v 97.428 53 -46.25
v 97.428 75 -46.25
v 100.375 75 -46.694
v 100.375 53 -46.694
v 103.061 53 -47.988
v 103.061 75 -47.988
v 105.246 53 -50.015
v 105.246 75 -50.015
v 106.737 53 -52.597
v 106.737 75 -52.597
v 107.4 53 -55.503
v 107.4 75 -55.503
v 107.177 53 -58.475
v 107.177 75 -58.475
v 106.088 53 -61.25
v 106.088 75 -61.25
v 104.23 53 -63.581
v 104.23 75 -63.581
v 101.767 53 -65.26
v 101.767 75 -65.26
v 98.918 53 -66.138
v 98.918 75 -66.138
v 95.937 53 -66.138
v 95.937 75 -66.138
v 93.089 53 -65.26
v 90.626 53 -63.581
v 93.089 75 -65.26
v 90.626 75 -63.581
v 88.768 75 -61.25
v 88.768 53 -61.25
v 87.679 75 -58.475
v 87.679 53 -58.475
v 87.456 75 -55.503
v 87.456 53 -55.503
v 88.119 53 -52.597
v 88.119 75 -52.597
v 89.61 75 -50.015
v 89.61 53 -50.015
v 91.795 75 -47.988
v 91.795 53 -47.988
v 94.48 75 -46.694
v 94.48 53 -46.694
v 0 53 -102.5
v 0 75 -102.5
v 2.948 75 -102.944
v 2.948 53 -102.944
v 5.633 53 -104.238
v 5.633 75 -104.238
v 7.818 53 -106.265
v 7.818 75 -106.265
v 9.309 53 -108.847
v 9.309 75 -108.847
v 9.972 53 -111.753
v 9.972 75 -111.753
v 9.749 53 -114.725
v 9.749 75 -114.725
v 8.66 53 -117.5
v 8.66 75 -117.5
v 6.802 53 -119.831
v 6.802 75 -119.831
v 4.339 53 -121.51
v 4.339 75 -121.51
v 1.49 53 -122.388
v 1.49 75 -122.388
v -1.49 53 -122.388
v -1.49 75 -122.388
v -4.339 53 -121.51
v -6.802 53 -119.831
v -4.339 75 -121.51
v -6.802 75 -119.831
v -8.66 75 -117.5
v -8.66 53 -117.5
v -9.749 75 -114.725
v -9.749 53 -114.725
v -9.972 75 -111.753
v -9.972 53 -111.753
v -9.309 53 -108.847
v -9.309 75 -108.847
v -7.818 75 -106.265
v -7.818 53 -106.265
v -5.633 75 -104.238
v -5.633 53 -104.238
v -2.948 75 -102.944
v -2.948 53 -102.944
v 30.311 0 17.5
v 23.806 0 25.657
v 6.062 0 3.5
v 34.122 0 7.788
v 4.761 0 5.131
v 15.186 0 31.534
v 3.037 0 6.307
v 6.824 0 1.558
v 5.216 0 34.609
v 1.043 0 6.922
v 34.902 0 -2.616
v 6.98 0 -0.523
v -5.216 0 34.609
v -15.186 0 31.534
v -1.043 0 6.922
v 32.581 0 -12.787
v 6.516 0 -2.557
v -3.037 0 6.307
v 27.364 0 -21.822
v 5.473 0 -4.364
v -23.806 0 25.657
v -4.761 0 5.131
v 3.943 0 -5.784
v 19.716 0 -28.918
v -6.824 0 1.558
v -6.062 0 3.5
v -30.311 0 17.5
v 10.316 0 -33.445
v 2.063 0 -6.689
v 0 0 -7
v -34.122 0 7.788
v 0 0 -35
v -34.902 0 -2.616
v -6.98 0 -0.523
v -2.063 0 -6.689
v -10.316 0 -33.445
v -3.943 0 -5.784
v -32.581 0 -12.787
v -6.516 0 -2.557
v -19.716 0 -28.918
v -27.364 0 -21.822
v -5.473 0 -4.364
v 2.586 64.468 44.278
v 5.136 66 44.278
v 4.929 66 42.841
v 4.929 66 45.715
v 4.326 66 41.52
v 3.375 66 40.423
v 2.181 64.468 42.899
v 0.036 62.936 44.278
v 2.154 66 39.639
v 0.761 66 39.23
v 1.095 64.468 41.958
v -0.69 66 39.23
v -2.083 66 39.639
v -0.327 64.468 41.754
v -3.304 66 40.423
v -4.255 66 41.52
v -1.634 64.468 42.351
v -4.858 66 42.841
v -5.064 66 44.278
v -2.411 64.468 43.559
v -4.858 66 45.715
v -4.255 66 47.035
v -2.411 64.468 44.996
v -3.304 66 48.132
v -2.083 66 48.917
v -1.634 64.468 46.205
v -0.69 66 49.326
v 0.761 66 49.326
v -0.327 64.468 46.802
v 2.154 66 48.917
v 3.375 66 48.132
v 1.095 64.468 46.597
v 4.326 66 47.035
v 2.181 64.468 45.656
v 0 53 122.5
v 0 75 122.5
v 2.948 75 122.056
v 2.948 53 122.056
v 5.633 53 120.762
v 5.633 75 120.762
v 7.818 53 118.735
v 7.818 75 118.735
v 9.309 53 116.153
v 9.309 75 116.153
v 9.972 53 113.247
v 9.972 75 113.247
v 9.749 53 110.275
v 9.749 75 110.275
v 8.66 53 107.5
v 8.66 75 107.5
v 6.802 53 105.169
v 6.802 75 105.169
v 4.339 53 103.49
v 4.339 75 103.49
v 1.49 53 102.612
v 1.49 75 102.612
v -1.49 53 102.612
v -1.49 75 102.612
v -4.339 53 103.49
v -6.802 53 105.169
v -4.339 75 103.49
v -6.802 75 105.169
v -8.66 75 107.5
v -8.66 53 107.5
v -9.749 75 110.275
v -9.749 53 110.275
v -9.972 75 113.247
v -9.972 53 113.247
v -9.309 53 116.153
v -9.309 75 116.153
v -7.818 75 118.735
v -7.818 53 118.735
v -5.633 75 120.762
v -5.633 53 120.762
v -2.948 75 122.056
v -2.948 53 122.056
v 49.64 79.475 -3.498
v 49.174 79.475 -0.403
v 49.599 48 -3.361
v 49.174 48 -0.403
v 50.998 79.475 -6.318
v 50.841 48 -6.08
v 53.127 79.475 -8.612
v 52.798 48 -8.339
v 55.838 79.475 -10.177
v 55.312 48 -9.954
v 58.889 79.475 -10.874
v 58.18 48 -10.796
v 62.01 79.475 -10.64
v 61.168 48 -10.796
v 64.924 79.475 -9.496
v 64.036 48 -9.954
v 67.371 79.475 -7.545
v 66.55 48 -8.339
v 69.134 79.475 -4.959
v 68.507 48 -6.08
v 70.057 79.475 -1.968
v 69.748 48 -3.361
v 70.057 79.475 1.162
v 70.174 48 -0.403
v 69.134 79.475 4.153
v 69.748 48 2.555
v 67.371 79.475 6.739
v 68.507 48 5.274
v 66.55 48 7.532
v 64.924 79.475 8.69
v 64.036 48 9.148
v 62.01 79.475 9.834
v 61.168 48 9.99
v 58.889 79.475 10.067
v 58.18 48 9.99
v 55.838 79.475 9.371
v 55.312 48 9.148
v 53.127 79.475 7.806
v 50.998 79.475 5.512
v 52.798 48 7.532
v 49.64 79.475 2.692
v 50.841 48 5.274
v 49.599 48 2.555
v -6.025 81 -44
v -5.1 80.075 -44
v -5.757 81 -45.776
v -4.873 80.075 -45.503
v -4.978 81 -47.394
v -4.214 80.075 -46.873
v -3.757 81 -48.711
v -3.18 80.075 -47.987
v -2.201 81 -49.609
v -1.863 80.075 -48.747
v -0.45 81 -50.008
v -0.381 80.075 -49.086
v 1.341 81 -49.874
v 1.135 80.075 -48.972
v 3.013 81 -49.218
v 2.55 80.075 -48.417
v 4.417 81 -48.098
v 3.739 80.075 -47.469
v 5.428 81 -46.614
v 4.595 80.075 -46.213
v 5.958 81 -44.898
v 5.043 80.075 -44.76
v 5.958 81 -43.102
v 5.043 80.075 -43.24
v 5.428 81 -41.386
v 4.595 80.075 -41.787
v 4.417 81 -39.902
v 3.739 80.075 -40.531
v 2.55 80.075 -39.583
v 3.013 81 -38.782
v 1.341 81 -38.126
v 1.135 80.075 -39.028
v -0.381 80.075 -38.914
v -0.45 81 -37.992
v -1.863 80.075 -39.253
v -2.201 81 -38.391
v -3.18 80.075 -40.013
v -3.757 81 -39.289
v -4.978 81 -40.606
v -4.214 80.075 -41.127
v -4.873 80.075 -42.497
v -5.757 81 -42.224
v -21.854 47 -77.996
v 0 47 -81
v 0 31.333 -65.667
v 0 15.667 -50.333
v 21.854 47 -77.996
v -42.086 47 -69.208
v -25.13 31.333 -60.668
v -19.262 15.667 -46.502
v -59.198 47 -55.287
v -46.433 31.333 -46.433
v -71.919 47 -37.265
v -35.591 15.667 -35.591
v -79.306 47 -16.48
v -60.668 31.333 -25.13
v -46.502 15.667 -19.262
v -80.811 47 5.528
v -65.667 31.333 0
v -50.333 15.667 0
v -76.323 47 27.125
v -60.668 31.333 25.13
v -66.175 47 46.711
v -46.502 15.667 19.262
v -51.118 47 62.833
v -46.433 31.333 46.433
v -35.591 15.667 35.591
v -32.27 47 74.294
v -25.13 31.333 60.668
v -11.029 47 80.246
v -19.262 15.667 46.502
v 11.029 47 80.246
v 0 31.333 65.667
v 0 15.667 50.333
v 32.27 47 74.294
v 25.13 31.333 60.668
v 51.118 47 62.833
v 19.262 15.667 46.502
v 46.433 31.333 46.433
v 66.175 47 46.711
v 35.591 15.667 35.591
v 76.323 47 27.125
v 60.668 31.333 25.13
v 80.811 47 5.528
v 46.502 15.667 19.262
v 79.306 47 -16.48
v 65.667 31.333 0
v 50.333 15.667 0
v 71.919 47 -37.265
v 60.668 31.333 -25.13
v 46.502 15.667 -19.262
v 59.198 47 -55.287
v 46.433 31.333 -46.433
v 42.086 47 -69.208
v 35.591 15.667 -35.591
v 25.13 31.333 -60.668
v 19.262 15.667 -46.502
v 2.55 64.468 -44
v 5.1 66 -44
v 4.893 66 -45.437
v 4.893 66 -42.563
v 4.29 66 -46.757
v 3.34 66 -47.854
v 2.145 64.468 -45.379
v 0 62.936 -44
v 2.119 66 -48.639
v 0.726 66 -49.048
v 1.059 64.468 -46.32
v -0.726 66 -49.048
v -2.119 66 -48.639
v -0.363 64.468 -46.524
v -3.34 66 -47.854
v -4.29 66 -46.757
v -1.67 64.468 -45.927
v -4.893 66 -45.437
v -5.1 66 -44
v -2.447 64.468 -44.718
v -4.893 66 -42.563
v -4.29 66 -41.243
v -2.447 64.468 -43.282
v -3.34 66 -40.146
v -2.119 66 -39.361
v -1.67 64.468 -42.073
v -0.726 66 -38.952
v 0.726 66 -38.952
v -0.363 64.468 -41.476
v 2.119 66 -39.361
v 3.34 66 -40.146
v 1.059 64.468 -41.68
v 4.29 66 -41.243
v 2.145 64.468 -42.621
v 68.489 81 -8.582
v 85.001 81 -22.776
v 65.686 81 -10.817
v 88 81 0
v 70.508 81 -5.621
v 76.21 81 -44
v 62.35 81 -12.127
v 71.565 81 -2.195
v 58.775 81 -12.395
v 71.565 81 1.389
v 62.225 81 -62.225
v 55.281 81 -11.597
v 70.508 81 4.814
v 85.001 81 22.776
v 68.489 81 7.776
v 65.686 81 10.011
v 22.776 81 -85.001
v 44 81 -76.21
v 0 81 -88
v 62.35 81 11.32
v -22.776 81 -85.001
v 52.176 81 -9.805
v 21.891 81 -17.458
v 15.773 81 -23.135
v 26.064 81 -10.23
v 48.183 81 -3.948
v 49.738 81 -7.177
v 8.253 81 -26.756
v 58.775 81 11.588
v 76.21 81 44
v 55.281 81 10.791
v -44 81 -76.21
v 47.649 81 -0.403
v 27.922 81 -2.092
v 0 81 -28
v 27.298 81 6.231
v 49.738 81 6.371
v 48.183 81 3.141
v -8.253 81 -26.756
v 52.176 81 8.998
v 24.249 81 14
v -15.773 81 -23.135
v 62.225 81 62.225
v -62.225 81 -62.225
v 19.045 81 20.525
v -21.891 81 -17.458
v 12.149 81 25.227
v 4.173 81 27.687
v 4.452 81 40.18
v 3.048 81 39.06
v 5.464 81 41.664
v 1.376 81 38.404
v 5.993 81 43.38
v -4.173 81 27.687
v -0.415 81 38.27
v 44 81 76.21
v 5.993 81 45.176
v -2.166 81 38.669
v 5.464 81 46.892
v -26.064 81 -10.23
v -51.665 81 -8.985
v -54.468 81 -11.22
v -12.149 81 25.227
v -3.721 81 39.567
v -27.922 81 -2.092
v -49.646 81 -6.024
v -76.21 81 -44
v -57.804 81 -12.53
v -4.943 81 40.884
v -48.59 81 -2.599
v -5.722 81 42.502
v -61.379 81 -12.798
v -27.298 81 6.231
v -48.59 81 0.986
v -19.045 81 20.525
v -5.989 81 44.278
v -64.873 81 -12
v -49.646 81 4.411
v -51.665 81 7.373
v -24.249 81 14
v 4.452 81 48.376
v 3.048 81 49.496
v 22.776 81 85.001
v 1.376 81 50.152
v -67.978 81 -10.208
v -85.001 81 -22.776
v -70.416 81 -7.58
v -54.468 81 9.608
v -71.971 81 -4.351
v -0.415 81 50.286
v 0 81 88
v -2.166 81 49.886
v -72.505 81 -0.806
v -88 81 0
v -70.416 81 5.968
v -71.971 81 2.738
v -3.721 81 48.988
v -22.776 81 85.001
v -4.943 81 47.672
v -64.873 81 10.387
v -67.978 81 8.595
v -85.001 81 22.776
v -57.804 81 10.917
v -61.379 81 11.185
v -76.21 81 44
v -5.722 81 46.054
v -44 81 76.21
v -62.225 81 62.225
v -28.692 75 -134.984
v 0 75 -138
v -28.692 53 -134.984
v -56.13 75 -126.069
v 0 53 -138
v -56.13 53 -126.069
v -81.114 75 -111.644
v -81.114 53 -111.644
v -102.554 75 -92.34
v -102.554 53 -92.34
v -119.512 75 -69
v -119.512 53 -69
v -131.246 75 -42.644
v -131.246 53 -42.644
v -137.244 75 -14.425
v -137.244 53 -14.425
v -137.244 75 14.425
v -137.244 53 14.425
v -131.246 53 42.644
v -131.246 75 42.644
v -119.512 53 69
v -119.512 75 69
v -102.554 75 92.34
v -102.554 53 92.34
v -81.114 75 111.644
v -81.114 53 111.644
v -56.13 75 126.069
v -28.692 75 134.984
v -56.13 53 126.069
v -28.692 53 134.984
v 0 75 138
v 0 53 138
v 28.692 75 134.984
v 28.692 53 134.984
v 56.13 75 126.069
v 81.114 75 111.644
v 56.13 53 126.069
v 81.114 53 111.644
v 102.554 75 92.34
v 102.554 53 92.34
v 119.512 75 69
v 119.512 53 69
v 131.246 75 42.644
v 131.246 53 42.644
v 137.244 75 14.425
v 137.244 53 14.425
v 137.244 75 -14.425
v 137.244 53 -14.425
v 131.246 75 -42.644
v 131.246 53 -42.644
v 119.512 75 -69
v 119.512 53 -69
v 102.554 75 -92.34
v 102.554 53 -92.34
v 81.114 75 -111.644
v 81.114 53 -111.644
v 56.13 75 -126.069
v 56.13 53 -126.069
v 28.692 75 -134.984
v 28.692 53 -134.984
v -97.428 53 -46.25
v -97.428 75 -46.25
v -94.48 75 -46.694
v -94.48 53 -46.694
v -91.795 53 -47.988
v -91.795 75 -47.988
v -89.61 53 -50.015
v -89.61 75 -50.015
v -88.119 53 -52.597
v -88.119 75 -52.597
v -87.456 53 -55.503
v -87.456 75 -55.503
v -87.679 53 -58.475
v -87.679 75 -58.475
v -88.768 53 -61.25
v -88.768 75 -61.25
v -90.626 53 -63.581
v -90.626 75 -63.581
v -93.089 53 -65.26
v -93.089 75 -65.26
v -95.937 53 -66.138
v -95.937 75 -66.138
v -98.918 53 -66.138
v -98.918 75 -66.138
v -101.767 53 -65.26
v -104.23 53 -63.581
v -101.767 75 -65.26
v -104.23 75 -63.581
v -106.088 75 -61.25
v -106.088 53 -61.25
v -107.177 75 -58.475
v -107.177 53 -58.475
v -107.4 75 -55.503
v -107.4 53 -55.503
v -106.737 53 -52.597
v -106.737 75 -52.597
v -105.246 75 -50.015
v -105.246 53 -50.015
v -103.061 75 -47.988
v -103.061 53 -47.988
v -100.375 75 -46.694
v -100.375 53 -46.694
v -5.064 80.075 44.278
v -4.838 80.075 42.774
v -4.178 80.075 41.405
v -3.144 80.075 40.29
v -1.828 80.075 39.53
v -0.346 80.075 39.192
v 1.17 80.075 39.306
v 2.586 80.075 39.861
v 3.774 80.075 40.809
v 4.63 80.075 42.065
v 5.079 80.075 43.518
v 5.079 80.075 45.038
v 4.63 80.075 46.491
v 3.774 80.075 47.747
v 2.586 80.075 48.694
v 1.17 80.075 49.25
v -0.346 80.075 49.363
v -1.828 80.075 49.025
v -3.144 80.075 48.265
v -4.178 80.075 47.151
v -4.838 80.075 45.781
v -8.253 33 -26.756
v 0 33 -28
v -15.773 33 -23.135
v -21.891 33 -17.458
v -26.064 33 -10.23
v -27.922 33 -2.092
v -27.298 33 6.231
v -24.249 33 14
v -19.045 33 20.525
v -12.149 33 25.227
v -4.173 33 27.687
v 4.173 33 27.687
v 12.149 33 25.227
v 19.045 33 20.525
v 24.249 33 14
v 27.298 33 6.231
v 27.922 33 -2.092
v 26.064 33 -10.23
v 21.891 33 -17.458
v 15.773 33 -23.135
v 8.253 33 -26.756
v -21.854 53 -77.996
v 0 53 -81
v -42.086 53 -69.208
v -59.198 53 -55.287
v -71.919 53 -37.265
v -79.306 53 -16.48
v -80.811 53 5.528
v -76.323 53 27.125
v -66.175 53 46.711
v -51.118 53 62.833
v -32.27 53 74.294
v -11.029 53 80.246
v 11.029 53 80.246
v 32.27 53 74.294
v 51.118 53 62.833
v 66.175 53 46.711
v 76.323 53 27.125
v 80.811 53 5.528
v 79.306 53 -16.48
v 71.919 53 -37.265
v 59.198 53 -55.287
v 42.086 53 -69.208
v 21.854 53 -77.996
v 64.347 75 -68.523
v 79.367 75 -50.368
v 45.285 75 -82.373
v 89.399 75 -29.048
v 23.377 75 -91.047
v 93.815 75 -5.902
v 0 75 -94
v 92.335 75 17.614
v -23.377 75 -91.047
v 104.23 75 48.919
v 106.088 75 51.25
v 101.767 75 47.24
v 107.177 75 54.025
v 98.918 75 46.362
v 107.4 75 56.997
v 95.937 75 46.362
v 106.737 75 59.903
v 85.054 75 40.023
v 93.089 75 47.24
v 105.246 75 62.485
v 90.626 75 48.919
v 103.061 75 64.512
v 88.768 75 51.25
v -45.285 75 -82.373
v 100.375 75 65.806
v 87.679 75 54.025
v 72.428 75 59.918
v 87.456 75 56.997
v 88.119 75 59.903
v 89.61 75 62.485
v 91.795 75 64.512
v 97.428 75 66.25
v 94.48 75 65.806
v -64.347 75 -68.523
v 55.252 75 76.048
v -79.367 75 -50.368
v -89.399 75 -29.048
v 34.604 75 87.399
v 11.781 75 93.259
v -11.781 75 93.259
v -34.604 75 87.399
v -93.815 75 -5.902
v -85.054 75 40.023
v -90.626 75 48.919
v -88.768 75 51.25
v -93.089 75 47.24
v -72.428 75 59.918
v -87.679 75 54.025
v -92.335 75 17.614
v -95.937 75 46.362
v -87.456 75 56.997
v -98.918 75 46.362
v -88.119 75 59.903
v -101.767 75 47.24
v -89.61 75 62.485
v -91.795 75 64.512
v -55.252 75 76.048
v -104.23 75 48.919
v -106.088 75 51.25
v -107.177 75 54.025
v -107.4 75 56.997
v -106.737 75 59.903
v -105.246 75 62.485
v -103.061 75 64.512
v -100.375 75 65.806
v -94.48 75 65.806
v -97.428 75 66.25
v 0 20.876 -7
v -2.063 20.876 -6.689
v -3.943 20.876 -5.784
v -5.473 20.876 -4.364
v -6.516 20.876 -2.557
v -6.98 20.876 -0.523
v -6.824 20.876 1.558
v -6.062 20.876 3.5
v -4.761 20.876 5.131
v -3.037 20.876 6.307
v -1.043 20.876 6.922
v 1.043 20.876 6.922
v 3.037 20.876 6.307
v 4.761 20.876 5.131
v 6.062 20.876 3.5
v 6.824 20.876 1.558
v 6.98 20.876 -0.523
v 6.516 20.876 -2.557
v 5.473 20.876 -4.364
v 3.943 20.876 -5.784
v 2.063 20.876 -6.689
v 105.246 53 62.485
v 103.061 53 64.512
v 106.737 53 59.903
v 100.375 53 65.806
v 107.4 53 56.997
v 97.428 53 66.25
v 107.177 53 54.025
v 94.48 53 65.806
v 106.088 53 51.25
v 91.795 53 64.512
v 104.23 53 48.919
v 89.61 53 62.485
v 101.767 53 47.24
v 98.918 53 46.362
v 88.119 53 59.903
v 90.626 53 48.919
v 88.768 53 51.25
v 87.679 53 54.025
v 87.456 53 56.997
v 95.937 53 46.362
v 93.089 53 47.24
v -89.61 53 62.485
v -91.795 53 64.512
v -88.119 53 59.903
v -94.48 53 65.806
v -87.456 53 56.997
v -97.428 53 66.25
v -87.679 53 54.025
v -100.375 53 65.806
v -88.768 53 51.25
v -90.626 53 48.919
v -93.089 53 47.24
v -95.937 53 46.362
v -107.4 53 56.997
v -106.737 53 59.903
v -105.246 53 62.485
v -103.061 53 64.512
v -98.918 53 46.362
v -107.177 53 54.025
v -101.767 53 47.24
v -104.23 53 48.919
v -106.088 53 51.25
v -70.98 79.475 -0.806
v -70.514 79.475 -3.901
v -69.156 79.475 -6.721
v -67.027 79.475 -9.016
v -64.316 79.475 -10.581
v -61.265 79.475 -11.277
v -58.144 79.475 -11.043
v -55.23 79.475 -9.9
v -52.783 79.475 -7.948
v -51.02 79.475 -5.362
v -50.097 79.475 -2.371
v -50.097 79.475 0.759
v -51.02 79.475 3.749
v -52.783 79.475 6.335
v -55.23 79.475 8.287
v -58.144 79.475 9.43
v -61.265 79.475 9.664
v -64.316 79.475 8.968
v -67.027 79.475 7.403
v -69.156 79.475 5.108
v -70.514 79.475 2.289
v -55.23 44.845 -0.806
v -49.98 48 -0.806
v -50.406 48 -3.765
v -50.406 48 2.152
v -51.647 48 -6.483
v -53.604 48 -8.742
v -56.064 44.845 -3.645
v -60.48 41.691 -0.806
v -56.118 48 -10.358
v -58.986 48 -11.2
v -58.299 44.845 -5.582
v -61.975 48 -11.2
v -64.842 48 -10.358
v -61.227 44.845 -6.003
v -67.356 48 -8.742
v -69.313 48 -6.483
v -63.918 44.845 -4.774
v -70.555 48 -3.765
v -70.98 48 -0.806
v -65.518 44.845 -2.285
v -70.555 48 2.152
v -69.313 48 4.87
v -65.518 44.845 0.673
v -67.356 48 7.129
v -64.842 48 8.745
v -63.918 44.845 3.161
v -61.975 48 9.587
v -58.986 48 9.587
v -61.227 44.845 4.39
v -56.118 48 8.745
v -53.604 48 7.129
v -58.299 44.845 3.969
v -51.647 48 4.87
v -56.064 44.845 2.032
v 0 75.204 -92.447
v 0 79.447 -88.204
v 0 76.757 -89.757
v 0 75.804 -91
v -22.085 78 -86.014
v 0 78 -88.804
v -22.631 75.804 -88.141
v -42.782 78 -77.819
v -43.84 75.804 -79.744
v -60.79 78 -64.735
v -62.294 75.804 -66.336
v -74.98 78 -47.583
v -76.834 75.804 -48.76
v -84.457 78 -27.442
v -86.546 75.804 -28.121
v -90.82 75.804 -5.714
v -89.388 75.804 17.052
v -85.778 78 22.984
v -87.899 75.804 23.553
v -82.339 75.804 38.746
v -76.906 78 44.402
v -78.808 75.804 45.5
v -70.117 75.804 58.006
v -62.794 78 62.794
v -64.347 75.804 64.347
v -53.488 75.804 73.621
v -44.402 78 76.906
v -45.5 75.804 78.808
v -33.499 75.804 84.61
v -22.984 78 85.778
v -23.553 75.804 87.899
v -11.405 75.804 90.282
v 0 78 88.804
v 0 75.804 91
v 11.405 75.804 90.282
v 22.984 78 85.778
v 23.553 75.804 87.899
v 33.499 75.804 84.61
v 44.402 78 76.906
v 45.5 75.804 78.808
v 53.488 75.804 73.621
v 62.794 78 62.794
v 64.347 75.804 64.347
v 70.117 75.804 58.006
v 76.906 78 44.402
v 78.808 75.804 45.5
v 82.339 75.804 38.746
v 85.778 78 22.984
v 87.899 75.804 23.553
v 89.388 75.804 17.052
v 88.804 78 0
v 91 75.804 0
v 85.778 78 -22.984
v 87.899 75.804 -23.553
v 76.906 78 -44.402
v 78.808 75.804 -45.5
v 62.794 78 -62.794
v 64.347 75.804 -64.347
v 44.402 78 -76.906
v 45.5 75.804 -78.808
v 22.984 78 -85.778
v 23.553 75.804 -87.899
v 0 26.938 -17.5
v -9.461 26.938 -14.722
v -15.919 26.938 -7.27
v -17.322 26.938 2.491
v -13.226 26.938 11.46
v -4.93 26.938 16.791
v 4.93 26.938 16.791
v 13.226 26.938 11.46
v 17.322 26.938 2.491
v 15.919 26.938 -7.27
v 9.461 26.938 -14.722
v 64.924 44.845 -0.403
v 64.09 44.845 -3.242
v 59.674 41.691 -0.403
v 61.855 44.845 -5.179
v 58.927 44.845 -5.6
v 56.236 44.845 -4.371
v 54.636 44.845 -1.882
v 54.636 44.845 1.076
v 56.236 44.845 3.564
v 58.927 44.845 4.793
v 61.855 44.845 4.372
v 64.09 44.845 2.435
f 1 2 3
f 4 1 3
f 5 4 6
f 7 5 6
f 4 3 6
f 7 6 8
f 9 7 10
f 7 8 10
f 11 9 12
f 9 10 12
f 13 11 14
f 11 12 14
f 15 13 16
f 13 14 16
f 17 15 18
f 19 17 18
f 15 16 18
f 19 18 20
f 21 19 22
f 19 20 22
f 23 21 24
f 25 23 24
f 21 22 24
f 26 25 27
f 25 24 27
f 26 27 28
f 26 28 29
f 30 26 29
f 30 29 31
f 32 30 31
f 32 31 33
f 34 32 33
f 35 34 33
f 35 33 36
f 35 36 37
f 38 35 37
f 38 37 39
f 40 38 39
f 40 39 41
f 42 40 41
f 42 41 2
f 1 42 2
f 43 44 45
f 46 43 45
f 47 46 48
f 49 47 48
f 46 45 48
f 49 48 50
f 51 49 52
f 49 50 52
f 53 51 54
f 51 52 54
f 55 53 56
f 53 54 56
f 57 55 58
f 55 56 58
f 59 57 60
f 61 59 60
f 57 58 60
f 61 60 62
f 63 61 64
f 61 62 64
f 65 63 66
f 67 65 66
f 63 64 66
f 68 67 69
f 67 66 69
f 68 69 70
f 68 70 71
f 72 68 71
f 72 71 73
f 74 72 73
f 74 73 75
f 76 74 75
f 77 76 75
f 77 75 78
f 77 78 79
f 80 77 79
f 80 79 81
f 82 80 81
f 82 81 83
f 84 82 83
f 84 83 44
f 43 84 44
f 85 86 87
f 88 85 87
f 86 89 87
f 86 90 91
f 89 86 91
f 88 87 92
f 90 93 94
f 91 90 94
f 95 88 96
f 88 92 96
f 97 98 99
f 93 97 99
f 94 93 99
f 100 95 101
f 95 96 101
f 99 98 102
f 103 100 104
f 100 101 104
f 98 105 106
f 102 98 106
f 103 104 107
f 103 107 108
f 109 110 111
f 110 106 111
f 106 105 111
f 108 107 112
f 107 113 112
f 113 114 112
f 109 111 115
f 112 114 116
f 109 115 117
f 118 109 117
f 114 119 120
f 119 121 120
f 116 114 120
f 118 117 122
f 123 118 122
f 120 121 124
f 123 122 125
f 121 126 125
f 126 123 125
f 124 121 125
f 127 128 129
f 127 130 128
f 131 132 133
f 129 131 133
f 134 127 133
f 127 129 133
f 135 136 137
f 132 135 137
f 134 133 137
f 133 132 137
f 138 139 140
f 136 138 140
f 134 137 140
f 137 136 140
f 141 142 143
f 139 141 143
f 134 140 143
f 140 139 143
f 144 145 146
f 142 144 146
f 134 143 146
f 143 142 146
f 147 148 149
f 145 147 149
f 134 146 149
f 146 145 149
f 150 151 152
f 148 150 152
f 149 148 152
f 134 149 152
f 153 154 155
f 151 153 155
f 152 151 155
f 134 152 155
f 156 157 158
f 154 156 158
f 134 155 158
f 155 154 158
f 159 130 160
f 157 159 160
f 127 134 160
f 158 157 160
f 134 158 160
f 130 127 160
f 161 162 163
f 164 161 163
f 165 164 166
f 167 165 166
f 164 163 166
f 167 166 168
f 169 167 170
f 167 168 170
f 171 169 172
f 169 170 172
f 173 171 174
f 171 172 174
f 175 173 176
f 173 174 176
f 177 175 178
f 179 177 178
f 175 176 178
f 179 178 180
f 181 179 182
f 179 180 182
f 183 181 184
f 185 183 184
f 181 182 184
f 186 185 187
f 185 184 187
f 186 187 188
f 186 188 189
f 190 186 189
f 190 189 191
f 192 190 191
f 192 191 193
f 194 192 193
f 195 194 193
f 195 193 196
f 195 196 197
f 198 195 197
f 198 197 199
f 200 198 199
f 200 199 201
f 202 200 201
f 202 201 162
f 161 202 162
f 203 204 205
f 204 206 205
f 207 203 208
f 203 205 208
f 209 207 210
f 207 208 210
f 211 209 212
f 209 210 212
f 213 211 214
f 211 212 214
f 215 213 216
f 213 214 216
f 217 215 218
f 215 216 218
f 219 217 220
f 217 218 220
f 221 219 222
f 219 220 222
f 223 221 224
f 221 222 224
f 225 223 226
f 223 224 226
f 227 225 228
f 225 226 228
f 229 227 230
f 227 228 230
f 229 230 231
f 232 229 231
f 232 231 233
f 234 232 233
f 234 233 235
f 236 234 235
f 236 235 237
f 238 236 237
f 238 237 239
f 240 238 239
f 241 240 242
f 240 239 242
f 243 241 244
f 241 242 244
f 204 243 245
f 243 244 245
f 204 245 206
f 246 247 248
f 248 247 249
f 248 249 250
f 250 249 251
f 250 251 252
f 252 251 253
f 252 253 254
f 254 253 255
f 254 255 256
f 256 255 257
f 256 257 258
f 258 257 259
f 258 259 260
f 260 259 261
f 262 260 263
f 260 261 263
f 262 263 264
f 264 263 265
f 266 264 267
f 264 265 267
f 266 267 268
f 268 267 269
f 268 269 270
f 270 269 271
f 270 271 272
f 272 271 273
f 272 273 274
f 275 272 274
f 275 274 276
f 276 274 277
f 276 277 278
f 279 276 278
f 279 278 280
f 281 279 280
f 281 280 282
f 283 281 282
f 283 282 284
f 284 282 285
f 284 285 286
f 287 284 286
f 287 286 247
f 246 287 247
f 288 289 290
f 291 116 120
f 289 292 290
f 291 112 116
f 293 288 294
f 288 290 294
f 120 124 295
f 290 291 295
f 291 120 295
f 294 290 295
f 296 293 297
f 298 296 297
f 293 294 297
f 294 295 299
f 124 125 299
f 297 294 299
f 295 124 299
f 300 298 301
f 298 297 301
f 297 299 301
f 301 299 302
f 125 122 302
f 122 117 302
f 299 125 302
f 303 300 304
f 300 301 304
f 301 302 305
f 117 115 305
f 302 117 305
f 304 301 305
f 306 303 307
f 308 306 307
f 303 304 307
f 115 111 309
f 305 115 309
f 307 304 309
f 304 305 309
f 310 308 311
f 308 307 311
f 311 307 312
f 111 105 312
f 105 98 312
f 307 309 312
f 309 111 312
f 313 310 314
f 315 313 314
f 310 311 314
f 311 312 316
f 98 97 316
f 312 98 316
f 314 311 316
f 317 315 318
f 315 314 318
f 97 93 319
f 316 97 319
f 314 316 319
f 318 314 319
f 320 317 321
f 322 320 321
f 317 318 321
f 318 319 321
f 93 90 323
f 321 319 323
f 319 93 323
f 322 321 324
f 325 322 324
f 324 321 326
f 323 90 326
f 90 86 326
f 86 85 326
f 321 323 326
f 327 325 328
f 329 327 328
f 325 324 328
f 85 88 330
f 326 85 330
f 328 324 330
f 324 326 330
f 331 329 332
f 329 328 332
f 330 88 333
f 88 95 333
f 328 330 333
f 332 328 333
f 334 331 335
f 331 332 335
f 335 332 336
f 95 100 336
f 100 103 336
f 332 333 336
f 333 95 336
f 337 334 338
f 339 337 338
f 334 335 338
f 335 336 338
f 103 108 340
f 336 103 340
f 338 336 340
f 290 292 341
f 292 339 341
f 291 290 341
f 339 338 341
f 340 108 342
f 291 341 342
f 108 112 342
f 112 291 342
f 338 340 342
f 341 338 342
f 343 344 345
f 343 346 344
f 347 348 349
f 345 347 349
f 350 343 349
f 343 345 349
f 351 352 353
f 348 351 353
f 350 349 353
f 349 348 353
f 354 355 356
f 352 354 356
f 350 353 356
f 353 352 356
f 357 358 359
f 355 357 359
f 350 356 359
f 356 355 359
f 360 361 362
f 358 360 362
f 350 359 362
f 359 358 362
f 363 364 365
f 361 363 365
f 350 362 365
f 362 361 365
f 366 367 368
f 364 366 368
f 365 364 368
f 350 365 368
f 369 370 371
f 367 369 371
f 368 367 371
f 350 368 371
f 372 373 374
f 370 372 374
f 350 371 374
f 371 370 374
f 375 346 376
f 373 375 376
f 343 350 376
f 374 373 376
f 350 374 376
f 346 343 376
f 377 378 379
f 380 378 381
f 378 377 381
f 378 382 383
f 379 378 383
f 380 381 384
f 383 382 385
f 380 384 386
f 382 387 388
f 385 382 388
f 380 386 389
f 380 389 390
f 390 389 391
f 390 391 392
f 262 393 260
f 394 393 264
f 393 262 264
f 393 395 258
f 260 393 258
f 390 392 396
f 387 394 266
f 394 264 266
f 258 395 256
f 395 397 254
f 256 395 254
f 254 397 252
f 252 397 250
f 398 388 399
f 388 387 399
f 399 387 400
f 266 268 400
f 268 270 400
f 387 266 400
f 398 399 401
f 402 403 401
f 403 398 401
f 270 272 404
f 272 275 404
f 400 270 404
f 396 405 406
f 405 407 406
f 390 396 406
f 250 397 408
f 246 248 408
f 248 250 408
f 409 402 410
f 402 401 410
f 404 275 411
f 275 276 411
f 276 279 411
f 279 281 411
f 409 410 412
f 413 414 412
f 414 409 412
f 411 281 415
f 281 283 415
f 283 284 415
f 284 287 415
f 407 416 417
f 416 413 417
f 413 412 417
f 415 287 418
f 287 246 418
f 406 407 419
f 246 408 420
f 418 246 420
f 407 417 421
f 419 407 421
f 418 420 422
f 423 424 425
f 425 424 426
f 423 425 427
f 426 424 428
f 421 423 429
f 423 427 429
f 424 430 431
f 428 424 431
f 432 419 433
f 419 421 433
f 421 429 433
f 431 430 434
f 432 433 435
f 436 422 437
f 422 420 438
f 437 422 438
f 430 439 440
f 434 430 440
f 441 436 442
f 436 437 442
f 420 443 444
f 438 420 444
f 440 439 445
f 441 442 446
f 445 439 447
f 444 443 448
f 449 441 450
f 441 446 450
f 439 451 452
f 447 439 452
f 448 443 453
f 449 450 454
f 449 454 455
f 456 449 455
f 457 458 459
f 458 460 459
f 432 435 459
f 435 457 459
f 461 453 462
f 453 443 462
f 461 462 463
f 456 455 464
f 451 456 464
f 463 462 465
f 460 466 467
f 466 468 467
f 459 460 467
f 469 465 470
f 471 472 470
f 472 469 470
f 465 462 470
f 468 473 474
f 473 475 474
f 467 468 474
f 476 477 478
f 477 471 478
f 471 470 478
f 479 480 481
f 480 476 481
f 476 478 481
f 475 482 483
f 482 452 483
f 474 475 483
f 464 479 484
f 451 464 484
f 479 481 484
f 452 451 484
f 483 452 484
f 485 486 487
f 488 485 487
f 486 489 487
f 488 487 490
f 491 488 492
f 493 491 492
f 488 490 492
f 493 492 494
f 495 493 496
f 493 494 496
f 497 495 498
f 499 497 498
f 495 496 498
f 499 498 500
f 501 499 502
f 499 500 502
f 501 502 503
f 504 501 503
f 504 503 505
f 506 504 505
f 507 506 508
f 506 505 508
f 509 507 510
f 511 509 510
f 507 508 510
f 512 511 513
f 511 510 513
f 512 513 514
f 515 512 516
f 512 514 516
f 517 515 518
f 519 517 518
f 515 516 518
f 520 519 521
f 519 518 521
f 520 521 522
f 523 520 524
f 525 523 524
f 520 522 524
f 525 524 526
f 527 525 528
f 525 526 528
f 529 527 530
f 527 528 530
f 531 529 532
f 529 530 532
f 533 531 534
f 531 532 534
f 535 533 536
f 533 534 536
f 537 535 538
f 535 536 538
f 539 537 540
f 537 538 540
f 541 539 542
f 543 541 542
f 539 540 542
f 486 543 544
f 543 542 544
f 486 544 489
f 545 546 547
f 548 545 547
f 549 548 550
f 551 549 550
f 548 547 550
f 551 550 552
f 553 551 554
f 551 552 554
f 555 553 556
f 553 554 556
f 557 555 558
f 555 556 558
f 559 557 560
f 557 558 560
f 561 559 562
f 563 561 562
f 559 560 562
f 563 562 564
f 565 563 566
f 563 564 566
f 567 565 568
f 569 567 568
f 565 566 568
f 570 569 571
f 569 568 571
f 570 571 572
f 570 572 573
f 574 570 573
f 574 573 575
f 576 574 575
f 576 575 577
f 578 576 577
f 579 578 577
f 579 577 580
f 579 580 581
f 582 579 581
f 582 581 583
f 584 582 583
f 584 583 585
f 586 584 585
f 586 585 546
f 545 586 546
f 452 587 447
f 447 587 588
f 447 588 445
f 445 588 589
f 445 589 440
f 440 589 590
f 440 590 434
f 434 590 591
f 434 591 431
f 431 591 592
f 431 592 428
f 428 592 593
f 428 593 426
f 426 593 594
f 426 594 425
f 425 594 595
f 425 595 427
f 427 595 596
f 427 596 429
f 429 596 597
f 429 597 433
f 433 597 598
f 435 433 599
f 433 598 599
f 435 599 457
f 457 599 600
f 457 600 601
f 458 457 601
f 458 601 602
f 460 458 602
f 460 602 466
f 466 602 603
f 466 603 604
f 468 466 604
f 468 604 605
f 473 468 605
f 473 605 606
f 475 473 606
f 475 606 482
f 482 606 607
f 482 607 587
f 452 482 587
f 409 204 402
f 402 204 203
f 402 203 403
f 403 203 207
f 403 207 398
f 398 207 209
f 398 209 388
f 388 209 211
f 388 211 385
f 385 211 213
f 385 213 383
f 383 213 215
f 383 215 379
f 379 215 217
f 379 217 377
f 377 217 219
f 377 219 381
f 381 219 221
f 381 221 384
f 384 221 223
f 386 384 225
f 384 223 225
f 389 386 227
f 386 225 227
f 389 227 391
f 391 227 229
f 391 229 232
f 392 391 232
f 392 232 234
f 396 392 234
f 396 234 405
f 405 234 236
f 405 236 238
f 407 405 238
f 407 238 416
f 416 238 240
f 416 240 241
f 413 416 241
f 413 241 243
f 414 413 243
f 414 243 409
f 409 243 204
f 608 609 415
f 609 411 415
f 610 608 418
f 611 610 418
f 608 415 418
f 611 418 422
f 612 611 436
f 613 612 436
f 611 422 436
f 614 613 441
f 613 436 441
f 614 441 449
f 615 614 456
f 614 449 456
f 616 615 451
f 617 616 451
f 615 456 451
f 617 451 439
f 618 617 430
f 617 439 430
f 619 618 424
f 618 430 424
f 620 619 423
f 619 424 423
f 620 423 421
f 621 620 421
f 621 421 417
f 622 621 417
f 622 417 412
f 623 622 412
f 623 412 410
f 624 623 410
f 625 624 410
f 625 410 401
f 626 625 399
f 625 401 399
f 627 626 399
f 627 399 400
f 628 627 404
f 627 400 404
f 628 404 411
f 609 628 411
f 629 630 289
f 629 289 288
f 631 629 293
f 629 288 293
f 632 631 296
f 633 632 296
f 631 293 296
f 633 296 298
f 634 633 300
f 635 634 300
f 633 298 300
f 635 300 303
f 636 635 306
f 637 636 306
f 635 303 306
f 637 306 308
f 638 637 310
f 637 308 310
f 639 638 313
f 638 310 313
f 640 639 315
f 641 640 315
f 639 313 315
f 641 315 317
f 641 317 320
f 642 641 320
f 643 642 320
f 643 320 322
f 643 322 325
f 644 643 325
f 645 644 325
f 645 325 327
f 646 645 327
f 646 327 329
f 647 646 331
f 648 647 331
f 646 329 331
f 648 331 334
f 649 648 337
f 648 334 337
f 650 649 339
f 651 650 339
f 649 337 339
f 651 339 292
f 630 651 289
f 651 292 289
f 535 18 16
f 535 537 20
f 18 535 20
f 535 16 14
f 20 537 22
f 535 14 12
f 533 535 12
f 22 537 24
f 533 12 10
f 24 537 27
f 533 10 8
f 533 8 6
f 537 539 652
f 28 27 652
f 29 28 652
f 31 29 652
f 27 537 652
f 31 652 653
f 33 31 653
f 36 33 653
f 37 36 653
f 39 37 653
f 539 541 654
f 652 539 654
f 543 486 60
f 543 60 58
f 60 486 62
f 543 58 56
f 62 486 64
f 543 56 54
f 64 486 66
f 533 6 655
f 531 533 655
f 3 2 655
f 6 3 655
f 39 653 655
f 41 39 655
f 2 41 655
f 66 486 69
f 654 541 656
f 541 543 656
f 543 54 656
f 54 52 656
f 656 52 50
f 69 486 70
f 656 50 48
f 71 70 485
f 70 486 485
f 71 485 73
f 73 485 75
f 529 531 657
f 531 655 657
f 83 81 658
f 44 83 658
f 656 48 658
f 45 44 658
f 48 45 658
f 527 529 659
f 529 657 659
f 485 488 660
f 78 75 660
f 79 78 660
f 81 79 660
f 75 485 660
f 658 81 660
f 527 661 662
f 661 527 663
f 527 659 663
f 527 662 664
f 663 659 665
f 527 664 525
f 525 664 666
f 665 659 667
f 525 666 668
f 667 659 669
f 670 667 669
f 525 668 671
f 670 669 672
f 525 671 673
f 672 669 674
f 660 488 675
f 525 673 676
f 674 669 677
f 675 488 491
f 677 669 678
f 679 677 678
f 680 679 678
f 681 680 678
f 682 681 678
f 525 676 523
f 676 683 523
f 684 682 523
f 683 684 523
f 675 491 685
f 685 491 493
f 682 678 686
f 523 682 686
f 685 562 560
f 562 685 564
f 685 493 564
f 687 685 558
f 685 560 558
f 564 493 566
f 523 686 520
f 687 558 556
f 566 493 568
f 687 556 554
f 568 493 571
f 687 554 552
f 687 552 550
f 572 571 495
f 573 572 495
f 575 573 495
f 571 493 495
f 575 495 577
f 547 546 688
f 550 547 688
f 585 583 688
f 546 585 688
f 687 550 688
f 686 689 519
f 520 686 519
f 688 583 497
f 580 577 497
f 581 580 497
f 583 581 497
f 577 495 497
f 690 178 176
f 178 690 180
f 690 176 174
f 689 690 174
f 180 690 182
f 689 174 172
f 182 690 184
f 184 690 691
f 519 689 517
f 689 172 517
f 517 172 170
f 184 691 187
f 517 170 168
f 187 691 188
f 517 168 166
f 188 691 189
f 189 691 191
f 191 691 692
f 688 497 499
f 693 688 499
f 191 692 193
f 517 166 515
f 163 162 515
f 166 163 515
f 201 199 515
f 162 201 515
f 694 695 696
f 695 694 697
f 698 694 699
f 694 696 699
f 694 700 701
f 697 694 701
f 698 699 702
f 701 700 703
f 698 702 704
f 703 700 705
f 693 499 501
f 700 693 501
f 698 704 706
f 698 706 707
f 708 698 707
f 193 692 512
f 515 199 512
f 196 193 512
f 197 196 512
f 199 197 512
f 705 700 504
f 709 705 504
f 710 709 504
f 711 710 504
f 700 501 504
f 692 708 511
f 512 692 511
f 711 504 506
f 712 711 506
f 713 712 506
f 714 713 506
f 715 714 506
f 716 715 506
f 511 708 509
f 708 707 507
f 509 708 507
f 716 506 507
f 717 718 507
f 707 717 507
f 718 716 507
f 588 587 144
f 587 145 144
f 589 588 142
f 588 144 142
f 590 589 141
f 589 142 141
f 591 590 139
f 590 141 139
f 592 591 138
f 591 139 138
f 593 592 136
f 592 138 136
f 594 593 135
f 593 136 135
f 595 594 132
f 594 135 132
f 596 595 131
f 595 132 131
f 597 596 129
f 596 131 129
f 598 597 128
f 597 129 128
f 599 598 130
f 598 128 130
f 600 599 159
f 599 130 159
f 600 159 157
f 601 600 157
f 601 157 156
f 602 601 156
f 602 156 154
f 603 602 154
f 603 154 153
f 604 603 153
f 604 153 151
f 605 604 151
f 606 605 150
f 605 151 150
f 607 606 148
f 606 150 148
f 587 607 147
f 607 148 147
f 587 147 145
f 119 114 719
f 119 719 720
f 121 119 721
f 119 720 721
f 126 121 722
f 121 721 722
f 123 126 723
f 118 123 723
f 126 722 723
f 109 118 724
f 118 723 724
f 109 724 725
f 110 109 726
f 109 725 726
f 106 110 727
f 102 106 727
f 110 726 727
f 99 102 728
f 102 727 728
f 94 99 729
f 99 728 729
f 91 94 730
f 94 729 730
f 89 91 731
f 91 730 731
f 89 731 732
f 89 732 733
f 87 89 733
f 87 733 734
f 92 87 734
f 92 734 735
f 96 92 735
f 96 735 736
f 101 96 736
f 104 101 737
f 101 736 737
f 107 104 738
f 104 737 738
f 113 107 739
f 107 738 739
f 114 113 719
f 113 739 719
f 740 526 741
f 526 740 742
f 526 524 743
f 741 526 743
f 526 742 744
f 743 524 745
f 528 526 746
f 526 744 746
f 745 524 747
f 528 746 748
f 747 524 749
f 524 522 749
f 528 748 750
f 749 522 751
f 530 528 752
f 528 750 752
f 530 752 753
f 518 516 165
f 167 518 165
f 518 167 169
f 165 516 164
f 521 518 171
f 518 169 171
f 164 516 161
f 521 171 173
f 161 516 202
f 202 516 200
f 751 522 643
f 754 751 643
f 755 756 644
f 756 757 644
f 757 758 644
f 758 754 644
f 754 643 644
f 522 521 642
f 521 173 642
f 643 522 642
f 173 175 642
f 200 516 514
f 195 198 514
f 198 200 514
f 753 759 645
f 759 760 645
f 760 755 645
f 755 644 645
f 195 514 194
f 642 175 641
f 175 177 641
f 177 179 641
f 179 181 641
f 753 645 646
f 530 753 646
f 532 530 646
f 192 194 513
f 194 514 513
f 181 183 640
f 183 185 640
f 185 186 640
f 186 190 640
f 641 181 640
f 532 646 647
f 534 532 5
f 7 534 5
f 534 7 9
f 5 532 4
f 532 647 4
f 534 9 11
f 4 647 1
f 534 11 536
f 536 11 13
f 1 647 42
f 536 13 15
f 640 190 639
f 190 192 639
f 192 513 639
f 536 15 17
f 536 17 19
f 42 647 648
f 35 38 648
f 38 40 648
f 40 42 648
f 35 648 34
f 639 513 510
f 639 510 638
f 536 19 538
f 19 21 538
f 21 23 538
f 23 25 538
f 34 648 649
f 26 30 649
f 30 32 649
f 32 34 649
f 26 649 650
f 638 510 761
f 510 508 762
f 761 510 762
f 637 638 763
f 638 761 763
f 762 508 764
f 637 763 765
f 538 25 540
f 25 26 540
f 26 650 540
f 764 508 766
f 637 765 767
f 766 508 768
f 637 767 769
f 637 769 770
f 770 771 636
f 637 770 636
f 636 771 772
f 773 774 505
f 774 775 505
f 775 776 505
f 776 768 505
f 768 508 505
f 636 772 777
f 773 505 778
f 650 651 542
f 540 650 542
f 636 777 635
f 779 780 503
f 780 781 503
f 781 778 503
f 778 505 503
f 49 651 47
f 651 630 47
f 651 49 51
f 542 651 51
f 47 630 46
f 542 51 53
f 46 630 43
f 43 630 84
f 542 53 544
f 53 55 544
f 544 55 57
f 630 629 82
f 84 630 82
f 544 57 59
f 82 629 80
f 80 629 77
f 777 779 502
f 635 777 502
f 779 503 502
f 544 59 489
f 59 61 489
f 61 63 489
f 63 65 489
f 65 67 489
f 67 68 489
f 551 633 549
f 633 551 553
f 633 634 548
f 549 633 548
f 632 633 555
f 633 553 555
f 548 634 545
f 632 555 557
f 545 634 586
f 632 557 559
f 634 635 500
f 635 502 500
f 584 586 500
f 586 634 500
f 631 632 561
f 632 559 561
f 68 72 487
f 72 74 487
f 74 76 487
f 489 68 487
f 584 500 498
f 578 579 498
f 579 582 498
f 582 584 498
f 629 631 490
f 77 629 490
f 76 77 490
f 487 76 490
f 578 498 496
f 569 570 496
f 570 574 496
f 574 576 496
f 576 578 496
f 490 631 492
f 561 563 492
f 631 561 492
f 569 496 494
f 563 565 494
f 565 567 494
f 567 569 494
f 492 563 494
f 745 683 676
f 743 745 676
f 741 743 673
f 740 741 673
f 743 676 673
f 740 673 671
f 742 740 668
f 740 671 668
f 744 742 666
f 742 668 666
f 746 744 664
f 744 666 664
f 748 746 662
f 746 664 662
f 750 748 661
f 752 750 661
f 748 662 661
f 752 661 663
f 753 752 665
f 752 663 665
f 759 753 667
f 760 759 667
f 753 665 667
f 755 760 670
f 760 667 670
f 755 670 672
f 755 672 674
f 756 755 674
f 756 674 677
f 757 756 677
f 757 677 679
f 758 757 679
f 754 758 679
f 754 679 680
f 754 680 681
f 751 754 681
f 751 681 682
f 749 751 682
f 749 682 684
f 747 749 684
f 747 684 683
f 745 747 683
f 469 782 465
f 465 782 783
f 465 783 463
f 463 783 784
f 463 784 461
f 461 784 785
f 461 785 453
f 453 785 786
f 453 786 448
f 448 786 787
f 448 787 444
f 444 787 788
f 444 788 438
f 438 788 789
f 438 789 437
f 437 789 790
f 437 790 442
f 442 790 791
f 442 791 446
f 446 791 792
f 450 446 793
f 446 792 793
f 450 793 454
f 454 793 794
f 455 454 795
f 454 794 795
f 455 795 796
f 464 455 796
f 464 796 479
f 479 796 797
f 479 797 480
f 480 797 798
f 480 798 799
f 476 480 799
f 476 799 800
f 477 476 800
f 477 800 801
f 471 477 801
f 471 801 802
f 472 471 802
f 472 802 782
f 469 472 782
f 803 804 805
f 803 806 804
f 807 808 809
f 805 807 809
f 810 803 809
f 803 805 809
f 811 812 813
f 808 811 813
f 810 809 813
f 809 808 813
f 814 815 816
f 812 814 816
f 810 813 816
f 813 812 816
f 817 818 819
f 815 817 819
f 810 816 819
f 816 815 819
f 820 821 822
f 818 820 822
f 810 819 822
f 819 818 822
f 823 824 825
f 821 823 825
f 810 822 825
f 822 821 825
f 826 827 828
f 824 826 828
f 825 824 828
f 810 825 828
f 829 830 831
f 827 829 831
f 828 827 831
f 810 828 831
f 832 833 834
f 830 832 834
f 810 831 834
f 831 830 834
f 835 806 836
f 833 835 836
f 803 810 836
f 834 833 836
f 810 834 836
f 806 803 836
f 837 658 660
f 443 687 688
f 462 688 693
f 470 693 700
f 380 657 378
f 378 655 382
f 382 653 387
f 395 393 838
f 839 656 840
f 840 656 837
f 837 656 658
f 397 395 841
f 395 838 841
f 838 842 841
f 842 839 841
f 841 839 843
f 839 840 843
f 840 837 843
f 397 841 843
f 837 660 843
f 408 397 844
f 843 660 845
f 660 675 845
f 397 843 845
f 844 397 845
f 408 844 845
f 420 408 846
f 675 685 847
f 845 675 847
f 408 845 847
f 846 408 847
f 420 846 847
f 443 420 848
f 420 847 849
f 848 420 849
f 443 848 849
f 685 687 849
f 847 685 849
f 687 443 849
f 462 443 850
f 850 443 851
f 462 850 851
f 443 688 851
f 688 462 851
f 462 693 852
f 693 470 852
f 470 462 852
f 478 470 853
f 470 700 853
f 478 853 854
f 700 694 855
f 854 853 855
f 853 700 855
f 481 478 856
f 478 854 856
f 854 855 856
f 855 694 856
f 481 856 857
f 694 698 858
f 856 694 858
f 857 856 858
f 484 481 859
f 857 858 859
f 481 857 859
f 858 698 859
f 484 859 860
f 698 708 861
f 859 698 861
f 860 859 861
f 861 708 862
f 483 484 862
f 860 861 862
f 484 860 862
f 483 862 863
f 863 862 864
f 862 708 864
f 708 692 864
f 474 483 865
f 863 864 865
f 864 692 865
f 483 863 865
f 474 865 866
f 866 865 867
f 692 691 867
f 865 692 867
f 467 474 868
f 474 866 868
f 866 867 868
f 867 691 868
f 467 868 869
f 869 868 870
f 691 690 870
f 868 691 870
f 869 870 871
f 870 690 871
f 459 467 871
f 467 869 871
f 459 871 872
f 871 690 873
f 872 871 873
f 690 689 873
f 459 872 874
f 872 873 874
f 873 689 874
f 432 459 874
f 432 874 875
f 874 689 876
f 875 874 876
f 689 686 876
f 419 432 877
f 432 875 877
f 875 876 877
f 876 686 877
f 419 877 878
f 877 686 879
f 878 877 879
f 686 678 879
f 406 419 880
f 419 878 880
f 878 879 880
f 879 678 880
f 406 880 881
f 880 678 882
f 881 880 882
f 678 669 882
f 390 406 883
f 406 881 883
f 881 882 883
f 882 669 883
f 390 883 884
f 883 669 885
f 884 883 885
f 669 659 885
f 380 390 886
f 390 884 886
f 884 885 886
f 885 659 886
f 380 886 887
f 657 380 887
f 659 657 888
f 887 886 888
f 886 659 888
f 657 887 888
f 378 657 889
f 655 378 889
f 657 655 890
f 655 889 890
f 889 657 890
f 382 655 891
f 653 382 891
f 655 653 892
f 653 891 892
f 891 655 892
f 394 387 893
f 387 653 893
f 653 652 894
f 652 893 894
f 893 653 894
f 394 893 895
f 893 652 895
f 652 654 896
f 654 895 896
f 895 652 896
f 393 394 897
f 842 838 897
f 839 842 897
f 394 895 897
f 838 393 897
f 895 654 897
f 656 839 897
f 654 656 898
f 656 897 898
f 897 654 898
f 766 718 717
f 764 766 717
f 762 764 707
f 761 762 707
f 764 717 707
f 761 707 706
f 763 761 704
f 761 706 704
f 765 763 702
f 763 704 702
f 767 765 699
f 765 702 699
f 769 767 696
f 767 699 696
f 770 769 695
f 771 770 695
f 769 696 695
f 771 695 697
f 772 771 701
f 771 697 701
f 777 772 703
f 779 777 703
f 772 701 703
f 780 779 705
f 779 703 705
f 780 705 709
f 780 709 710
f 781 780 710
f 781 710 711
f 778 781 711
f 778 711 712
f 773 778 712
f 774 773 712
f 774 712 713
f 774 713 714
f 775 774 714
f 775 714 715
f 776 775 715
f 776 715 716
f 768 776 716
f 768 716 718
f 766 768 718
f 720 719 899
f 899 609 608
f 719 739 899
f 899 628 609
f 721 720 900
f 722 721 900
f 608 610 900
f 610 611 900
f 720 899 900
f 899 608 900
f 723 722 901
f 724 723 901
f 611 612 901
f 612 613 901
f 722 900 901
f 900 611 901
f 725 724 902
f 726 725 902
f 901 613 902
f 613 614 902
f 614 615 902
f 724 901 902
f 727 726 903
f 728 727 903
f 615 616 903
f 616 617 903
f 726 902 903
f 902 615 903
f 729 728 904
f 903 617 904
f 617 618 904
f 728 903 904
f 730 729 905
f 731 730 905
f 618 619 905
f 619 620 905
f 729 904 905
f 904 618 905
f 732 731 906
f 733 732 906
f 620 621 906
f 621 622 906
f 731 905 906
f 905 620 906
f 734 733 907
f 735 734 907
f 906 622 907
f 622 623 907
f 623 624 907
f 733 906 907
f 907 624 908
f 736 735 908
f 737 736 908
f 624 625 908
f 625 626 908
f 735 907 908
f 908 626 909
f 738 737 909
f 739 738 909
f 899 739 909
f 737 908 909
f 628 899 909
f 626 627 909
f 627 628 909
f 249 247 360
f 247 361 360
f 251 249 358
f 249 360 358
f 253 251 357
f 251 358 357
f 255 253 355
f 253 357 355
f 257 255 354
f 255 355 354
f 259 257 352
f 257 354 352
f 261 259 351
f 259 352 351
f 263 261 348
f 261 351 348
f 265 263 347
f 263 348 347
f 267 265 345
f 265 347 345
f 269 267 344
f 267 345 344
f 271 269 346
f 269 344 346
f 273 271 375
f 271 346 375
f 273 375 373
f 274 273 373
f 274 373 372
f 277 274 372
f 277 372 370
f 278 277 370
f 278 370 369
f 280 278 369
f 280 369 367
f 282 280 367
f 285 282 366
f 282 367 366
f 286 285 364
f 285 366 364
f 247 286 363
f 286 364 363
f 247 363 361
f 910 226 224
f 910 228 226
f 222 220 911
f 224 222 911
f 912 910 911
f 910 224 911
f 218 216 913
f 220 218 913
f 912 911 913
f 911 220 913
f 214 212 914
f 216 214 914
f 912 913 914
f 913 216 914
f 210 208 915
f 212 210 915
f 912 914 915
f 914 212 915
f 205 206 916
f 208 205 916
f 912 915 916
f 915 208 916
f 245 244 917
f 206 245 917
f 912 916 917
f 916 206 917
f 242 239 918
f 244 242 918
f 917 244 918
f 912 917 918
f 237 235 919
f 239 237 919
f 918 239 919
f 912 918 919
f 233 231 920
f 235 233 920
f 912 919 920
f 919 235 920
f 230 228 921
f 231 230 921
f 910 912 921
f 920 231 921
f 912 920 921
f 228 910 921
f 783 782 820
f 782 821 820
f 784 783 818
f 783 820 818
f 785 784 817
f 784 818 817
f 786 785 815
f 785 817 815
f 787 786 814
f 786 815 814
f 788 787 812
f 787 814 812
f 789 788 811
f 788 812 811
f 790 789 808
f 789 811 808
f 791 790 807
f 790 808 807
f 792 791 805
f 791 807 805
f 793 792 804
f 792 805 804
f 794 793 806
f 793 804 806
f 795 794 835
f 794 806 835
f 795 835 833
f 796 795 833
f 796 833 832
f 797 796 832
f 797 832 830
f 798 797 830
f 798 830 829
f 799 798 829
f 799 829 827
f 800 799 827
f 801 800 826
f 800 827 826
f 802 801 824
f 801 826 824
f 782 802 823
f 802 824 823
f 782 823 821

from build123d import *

# Parameters (mm, degrees)
M12_TAPPED_HOLE1_D           = 10.2
M12_TAPPED_HOLE1_DEPTH       = 15
M12_TAPPED_HOLE1_CSINK_D     = 12.05
M12_TAPPED_HOLE1_CSINK_ANGLE = 90
M12_TAPPED_HOLE1_TIP         = 3.064389157
M12_TAPPED_HOLE3_D           = 10.2
M12_TAPPED_HOLE3_DEPTH       = 15
M12_TAPPED_HOLE3_CSINK_D     = 12.05
M12_TAPPED_HOLE3_CSINK_ANGLE = 90
M12_TAPPED_HOLE3_TIP         = 3.064389157
M24_TAPPED_HOLE2_D           = 21
M24_TAPPED_HOLE2_DEPTH       = 33
M24_TAPPED_HOLE2_CSINK_D     = 24.05
M24_TAPPED_HOLE2_CSINK_ANGLE = 90
M24_TAPPED_HOLE2_TIP         = 6.3090365
CUT_EXTRUDE1_REACH           = 211.077
SKETCH3_R                    = 10


with BuildPart() as part:
    # Sketch2 → Revolve1 (revolve)
    with BuildSketch(Plane.XY, mode=Mode.PRIVATE) as revolve1_sk:
        with BuildLine():
            Line((7, 0), (7, 20.875644347))
            Line((7, 20.875644347), (28, 33))
            Line((28, 33), (28, 81))
            Line((28, 81), (88, 81))
            ThreePointArc((88, 81), (89.757359313, 76.757359313), (94, 75))
            Line((94, 75), (138, 75))
            Line((138, 75), (138, 53))
            Line((138, 53), (81, 53))
            Line((81, 53), (81, 47))
            Line((81, 47), (35, 0))
            Line((35, 0), (7, 0))
        make_face()
    revolve(revolve1_sk.sketch.rotate(Axis((0, 0, 0), (0, 1, 0)), 90), axis=Axis((0, 0, 0), (0, 1, 0)))

    # M12 Tapped Hole1
    with Locations(Plane(origin=(0, 81, 0), x_dir=(1, 0, 0), z_dir=(0, 1, 0))):
        with Locations((0.035531834, -44.277728927)):
            CounterSinkHole(M12_TAPPED_HOLE1_D / 2, M12_TAPPED_HOLE1_CSINK_D / 2, depth=M12_TAPPED_HOLE1_DEPTH, counter_sink_angle=M12_TAPPED_HOLE1_CSINK_ANGLE)
            with Locations((0, 0, -(M12_TAPPED_HOLE1_DEPTH + M12_TAPPED_HOLE1_TIP / 2))):  # 118° drill point
                Cone(0, M12_TAPPED_HOLE1_D / 2, M12_TAPPED_HOLE1_TIP, mode=Mode.SUBTRACT)

    # M12 Tapped Hole3
    with Locations(Plane(origin=(0, 81, 0), x_dir=(1, 0, 0), z_dir=(0, 1, 0))):
        with Locations((0, 44)):
            CounterSinkHole(M12_TAPPED_HOLE3_D / 2, M12_TAPPED_HOLE3_CSINK_D / 2, depth=M12_TAPPED_HOLE3_DEPTH, counter_sink_angle=M12_TAPPED_HOLE3_CSINK_ANGLE)
            with Locations((0, 0, -(M12_TAPPED_HOLE3_DEPTH + M12_TAPPED_HOLE3_TIP / 2))):  # 118° drill point
                Cone(0, M12_TAPPED_HOLE3_D / 2, M12_TAPPED_HOLE3_TIP, mode=Mode.SUBTRACT)

    # M24 Tapped Hole2
    with Locations(Plane(origin=(0, 81, 0), x_dir=(1, 0, 0), z_dir=(0, 1, 0))):
        with Locations((59.673816791, 0.403201465), (0, 0), (-60.480219721, 0.80640293)):
            CounterSinkHole(M24_TAPPED_HOLE2_D / 2, M24_TAPPED_HOLE2_CSINK_D / 2, depth=M24_TAPPED_HOLE2_DEPTH, counter_sink_angle=M24_TAPPED_HOLE2_CSINK_ANGLE)
            with Locations((0, 0, -(M24_TAPPED_HOLE2_DEPTH + M24_TAPPED_HOLE2_TIP / 2))):  # 118° drill point
                Cone(0, M24_TAPPED_HOLE2_D / 2, M24_TAPPED_HOLE2_TIP, mode=Mode.SUBTRACT)

    # Sketch3 → Cut-Extrude1 (cut, up to next)
    with BuildSketch(Plane(origin=(0, 75, 0), x_dir=(1, 0, 0), z_dir=(0, 1, 0)), mode=Mode.PRIVATE) as cut_extrude1_sk1:
        with Locations(Location((0, 112.5, 0), (0, 0, 270))):
            Circle(SKETCH3_R)
    cut_extrude1_tool1 = extrude(cut_extrude1_sk1.sketch, amount=-CUT_EXTRUDE1_REACH, mode=Mode.PRIVATE) & part.part
    # Sketch3 → Cut-Extrude1 (cut, up to next)
    with BuildSketch(Plane(origin=(0, 75, 0), x_dir=(1, 0, 0), z_dir=(0, 1, 0)), mode=Mode.PRIVATE) as cut_extrude1_sk2:
        with Locations(Location((97.427857926, 56.25, 0), (0, 0, 270))):
            Circle(SKETCH3_R)
    cut_extrude1_tool2 = extrude(cut_extrude1_sk2.sketch, amount=-CUT_EXTRUDE1_REACH, mode=Mode.PRIVATE) & part.part
    # Sketch3 → Cut-Extrude1 (cut, up to next)
    with BuildSketch(Plane(origin=(0, 75, 0), x_dir=(1, 0, 0), z_dir=(0, 1, 0)), mode=Mode.PRIVATE) as cut_extrude1_sk3:
        with Locations(Location((97.427857926, -56.25, 0), (0, 0, 270))):
            Circle(SKETCH3_R)
    cut_extrude1_tool3 = extrude(cut_extrude1_sk3.sketch, amount=-CUT_EXTRUDE1_REACH, mode=Mode.PRIVATE) & part.part
    # Sketch3 → Cut-Extrude1 (cut, up to next)
    with BuildSketch(Plane(origin=(0, 75, 0), x_dir=(1, 0, 0), z_dir=(0, 1, 0)), mode=Mode.PRIVATE) as cut_extrude1_sk4:
        with Locations(Location((0, -112.5, 0), (0, 0, 270))):
            Circle(SKETCH3_R)
    cut_extrude1_tool4 = extrude(cut_extrude1_sk4.sketch, amount=-CUT_EXTRUDE1_REACH, mode=Mode.PRIVATE) & part.part
    # Sketch3 → Cut-Extrude1 (cut, up to next)
    with BuildSketch(Plane(origin=(0, 75, 0), x_dir=(1, 0, 0), z_dir=(0, 1, 0)), mode=Mode.PRIVATE) as cut_extrude1_sk5:
        with Locations(Location((-97.427857926, -56.25, 0), (0, 0, 270))):
            Circle(SKETCH3_R)
    cut_extrude1_tool5 = extrude(cut_extrude1_sk5.sketch, amount=-CUT_EXTRUDE1_REACH, mode=Mode.PRIVATE) & part.part
    # Sketch3 → Cut-Extrude1 (cut, up to next)
    with BuildSketch(Plane(origin=(0, 75, 0), x_dir=(1, 0, 0), z_dir=(0, 1, 0)), mode=Mode.PRIVATE) as cut_extrude1_sk6:
        with Locations(Location((-97.427857926, 56.25, 0), (0, 0, 270))):
            Circle(SKETCH3_R)
    cut_extrude1_tool6 = extrude(cut_extrude1_sk6.sketch, amount=-CUT_EXTRUDE1_REACH, mode=Mode.PRIVATE) & part.part
    add(cut_extrude1_tool1.solids().sort_by_distance((0, 75, -112.5))[0], mode=Mode.SUBTRACT)
    add(cut_extrude1_tool2.solids().sort_by_distance((97.427858, 75, -56.25))[0], mode=Mode.SUBTRACT)
    add(cut_extrude1_tool3.solids().sort_by_distance((97.427858, 75, 56.25))[0], mode=Mode.SUBTRACT)
    add(cut_extrude1_tool4.solids().sort_by_distance((0, 75, 112.5))[0], mode=Mode.SUBTRACT)
    add(cut_extrude1_tool5.solids().sort_by_distance((-97.427858, 75, 56.25))[0], mode=Mode.SUBTRACT)
    add(cut_extrude1_tool6.solids().sort_by_distance((-97.427858, 75, -56.25))[0], mode=Mode.SUBTRACT)


solid = part.part
